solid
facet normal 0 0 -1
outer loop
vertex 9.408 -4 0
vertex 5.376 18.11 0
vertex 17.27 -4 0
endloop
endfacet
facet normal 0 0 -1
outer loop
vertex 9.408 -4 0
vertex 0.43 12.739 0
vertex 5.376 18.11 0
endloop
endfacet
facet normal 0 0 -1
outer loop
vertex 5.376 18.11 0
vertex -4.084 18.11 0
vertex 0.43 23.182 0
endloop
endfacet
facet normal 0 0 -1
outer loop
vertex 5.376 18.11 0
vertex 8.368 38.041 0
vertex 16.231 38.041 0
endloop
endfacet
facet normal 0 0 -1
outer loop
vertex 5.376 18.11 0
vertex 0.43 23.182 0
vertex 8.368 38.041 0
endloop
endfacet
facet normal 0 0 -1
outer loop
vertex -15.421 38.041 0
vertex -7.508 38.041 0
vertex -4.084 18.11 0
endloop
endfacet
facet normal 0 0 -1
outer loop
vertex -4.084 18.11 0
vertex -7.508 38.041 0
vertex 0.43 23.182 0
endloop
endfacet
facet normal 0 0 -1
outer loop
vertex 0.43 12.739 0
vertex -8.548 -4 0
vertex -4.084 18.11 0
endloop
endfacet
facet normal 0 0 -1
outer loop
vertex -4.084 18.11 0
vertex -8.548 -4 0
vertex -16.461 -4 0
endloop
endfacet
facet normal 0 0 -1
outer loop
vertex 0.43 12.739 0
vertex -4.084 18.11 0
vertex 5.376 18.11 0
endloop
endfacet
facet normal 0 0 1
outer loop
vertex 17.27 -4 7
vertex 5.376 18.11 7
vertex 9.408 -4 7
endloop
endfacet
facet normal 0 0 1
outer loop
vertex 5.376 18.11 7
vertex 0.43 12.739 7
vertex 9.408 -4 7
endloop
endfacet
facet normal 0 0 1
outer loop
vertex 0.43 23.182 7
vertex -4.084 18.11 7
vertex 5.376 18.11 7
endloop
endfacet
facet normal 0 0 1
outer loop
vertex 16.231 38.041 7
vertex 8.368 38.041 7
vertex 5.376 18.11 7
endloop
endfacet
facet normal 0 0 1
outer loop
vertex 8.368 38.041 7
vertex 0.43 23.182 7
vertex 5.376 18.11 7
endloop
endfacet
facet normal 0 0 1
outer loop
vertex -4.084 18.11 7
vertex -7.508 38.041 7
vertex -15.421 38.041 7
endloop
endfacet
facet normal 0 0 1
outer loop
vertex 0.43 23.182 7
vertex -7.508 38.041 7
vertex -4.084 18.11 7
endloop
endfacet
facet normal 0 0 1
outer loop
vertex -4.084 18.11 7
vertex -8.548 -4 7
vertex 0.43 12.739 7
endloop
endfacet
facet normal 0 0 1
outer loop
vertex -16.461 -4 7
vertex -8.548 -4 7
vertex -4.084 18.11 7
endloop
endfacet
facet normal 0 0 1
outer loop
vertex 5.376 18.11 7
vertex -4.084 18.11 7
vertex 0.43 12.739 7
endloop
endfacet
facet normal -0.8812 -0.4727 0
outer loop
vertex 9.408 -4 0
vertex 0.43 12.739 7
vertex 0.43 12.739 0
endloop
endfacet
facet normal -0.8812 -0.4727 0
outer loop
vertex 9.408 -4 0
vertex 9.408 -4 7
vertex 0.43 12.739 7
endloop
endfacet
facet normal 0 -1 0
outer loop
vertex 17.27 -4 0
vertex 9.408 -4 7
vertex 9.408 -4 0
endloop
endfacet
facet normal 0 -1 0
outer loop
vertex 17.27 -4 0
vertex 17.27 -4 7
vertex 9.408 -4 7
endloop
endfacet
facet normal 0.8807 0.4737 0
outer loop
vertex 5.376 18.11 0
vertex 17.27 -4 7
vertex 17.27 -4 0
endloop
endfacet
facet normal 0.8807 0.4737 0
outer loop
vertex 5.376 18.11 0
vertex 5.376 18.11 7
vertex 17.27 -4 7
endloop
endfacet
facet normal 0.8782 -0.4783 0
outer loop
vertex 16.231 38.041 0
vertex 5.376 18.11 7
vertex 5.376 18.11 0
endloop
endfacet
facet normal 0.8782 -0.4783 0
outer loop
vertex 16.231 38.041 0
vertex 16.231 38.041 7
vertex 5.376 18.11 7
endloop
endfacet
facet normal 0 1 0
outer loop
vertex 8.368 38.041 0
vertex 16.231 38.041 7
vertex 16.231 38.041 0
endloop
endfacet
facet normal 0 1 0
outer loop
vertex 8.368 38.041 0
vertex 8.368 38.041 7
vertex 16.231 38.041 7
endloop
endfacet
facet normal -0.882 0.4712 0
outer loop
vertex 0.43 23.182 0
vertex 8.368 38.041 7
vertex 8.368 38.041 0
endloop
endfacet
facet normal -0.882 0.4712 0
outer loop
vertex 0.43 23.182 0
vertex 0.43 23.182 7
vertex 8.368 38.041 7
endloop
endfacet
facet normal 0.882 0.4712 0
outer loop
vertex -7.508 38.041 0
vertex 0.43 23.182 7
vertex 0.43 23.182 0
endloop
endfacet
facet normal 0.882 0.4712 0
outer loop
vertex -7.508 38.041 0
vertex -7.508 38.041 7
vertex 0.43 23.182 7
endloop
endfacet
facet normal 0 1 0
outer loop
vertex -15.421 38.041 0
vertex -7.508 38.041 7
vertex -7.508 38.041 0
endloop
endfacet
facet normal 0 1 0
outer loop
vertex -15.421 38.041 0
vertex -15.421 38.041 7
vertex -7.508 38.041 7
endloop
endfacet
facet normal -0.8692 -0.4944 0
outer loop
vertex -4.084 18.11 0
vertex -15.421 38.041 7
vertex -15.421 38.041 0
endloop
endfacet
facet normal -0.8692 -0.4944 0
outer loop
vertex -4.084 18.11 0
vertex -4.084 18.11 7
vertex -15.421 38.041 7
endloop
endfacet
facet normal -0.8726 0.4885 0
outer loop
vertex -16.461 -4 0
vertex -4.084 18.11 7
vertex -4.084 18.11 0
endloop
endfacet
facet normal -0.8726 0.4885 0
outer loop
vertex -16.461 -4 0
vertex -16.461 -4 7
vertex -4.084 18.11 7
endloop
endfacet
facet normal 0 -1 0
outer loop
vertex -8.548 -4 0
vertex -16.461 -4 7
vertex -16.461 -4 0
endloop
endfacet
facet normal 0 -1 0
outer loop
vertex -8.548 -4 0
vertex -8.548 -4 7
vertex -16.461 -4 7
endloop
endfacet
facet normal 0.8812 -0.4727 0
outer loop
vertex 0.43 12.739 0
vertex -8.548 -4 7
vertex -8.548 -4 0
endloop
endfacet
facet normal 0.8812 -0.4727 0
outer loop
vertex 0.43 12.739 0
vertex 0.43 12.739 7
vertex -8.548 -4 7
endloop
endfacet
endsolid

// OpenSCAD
// file: glyph.scad
// glyph — the shared geometry of every letter in the set. Defines named geometry
// only, so it renders nothing on its own; each letter part includes it and calls
// letter(). Every dimension lives in ../../lib/common.scad.
//
// A LETTER IS NOTHING BUT A LETTER. No plinth, no tongue, no tab — it is the
// bare glyph, and it attaches by standing in the deck groove and resting on the
// groove's floor. Anything else on it would be a distraction on a learning toy.
//
// It is a flat plate of one thickness, printed face-down: no overhang anywhere,
// no supports, and the face on the bed comes out smoothest.
//
// TWO TRAPS WITH text():
//
//  * A missing font FALLS BACK SILENTLY — no warning, no error, just different
//    letters. "Liberation Sans" was the first choice here because OpenSCAD
//    bundles it; on macOS the bundled faces are not registered with fontconfig,
//    so it rendered the fallback face instead and nothing said so. To check a
//    font resolved, render a string with it and with a deliberately bogus name
//    and compare bounding boxes: identical means it fell back.
//  * `size` is not the cap height in general. For Helvetica Bold they coincide
//    (size 44 -> 44.0 mm cap), which is why letter_size reads as a height.
//    Change the font and re-measure.

include <../../lib/common.scad>

// The letter's outline, upright in the XY plane, ready to be extruded along Z
// (which is the letter's thickness, and the print's build axis).
//
//   y = 0   is the deck surface
//   y < 0   is the part standing down inside the groove. It reaches letter_bury,
//           which is where the tapered groove closes to letter_t — NOT the
//           groove's floor. The letter wedges; it never bottoms out.
module glyph_2d(ch) {
    intersection() {
        translate([0, -letter_bury])
            scale([letter_condense, 1])
                text(ch, size = letter_size, font = letter_font,
                     halign = "center", valign = "baseline");
        // Trimmed flat at the baseline. Round letters (O, C, G, S) overshoot the
        // baseline by design, and a letter standing on a convex curve rocks —
        // there is nothing to stop it leaning. The trim costs nothing visible
        // and gives every letter a flat foot on the groove floor.
        translate([-200, -letter_bury]) square([400, 400]);
    }
}

// One letter, in its print orientation: lying on its face, thickness up Z.
module letter(ch) {
    linear_extrude(letter_t) glyph_2d(ch);
}

// Where that letter sits once it is dropped into a chassis, for fit checks.
module letter_fitted(ch) {
    translate([0, letter_t/2, body_top]) rotate([90, 0, 0]) letter(ch);
}
// main file
// letter X — one part. See glyph.scad for the geometry and lib/common.scad for
// the dimensions. Prints lying on its face, exactly as exported: no supports.

include <glyph.scad>

letter("X");
